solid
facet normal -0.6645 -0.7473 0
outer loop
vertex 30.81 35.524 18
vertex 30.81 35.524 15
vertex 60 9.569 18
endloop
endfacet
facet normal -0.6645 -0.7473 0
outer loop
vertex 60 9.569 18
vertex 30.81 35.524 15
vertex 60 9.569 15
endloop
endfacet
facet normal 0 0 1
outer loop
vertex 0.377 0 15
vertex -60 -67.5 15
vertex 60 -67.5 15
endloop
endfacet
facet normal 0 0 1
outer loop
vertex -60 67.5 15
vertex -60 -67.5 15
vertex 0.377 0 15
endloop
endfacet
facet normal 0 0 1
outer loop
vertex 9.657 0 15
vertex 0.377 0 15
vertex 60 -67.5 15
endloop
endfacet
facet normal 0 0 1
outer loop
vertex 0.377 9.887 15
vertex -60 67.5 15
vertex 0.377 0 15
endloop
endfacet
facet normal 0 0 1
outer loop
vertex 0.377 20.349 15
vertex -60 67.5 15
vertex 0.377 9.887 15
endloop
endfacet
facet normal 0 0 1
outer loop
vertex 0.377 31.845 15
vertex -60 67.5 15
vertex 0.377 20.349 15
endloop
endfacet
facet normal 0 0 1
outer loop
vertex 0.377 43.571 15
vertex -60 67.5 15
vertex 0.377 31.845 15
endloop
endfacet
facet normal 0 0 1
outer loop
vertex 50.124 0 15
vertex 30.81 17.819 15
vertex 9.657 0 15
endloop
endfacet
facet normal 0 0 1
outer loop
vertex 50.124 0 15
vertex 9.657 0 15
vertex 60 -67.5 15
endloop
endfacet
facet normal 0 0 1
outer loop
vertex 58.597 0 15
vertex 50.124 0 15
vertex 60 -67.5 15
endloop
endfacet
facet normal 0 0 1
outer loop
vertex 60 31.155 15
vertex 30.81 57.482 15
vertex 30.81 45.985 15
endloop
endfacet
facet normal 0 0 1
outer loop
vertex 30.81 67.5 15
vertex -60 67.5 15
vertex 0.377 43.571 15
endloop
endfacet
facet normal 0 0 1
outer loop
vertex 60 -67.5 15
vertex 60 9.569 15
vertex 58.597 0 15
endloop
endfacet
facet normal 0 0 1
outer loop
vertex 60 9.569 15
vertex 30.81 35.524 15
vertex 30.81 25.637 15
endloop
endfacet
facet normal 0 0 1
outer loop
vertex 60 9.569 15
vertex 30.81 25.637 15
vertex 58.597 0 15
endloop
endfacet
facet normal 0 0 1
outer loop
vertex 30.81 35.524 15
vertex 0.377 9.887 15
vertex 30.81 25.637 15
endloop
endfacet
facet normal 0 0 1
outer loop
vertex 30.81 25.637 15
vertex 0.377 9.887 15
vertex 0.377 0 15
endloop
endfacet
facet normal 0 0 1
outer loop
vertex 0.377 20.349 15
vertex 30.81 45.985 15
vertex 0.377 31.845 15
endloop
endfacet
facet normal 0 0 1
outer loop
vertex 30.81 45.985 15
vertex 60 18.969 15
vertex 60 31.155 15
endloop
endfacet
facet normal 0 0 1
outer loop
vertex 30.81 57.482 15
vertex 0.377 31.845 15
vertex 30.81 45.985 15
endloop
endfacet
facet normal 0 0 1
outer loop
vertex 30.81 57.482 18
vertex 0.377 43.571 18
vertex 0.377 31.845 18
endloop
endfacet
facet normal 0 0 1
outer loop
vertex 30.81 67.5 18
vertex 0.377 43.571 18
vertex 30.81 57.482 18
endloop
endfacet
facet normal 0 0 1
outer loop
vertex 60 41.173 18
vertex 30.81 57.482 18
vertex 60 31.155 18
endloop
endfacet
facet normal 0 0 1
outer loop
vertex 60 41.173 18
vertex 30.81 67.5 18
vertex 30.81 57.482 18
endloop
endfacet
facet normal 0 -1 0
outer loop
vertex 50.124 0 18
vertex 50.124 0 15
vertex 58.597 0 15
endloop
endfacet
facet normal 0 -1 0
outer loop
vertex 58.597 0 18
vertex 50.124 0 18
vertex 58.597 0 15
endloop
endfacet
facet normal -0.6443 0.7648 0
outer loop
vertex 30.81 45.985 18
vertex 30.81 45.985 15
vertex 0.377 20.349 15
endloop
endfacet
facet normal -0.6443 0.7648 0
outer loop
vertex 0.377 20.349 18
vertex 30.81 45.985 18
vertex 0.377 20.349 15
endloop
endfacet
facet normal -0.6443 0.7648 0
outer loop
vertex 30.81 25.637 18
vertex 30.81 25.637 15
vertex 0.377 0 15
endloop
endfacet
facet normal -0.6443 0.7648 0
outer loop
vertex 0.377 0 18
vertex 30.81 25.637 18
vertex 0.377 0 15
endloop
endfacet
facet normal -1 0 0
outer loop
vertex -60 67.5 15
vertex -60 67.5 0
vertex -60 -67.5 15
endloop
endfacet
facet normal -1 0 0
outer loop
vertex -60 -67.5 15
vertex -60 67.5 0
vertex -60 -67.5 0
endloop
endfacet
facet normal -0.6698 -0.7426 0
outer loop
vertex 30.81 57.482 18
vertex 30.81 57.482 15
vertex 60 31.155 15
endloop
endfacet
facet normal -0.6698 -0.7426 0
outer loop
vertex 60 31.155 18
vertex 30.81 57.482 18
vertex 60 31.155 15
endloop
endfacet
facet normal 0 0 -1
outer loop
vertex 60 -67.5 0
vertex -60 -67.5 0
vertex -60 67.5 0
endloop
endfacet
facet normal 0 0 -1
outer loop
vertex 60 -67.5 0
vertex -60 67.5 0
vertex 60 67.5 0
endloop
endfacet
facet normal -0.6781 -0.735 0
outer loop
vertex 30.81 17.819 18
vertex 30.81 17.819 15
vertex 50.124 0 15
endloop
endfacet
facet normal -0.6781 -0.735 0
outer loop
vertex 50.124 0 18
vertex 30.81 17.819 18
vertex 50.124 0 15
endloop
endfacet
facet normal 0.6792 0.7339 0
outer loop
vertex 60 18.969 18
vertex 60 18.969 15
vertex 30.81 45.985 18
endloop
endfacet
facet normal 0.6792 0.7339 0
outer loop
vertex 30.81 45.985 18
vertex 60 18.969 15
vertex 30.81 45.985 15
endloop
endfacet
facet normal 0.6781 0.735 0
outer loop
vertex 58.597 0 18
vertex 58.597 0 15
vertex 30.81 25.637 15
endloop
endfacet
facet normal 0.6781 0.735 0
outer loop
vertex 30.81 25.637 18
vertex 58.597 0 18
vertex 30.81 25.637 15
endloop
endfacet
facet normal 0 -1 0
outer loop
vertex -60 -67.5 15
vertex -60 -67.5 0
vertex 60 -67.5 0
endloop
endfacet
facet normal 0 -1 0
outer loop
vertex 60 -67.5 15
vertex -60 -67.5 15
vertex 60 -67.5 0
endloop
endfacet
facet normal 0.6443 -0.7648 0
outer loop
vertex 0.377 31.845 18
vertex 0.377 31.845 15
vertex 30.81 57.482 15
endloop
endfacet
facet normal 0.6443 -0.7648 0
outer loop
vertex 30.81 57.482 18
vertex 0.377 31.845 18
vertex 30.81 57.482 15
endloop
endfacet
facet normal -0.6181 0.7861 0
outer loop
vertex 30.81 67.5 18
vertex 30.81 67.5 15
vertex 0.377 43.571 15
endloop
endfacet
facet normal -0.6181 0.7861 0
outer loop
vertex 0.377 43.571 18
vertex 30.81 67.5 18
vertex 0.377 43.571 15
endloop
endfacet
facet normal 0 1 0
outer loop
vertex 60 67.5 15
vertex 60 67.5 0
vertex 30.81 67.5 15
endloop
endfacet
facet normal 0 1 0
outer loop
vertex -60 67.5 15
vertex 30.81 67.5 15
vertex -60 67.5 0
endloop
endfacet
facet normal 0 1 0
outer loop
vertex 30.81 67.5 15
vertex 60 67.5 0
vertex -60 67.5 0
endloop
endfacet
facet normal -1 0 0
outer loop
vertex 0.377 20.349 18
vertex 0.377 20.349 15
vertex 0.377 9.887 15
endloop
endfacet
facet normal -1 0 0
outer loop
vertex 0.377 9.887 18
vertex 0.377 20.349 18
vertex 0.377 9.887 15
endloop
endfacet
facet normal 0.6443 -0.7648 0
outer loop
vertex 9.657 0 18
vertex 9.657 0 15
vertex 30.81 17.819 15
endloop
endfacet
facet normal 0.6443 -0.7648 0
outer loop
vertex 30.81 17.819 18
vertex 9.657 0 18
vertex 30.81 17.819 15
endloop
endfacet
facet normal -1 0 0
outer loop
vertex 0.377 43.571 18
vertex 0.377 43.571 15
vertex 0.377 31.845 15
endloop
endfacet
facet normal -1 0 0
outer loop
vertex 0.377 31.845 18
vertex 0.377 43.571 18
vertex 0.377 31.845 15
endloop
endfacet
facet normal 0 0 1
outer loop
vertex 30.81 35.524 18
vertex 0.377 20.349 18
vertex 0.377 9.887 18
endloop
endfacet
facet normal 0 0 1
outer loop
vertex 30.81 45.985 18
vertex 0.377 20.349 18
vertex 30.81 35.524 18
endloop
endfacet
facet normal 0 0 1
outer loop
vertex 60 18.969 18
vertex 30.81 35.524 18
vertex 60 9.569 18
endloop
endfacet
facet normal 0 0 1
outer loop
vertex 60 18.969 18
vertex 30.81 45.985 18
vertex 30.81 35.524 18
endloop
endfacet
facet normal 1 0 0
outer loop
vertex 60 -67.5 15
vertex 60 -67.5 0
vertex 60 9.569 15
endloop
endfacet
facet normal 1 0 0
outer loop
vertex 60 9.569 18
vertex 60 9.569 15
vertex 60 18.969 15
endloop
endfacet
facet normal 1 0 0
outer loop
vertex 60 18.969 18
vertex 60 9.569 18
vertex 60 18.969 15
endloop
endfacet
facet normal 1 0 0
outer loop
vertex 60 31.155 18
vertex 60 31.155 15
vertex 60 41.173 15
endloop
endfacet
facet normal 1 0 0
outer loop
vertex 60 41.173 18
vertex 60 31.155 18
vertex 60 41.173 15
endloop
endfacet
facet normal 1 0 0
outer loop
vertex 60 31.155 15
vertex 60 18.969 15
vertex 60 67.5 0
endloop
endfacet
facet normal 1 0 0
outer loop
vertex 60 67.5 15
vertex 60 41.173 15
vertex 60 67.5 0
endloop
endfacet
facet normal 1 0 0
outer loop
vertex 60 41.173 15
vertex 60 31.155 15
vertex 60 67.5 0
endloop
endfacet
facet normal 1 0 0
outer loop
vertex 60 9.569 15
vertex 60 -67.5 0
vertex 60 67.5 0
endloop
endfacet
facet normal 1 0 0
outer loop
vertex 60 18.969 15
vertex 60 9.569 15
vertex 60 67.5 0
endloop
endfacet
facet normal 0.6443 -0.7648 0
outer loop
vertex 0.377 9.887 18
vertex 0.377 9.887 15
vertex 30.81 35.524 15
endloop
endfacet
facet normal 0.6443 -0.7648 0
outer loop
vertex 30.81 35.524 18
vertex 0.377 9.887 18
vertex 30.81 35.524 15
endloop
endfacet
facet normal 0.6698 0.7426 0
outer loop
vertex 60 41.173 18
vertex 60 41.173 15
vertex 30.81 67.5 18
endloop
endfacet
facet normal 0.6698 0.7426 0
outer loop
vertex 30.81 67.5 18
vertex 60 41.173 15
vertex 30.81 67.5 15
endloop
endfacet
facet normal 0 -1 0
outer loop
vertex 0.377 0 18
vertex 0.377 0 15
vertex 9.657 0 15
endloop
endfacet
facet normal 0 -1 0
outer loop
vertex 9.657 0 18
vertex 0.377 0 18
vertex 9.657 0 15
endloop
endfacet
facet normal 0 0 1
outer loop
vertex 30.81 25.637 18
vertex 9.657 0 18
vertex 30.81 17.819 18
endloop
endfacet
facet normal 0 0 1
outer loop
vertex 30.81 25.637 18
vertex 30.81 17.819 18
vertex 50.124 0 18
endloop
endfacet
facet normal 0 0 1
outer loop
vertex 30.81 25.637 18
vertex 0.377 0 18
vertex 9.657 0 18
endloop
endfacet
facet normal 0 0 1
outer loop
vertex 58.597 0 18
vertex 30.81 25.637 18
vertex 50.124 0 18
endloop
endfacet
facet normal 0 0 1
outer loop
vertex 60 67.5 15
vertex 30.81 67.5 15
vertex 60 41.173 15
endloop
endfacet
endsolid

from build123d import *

# Parameters (mm, degrees)
F0_W     = 60
F0_H     = 67.5
F1_DEPTH = 15
F3_DEPTH = 3


with BuildPart() as f1:
    # F0 (on Top) → F1 (new body)
    with BuildSketch(Plane.XY):
        with Locations((-30, 33.75)):
            Rectangle(F0_W, F0_H)
        Polygon((60, 67.5), (0, 67.5), (0, 0), (5.978101, 0), (60, 0), align=None)
        with Locations((-30, -33.75)):
            Rectangle(F0_W, F0_H)
        Polygon((5.978101, 0), (0, 0), (0, -67.5), (60, -67.5), (60, 0), align=None)
    extrude(amount=F1_DEPTH)

    # F2 (on face) → F3 (join)
    with BuildSketch(Plane.XY.offset(15)):
        Polygon((9.656936, 0), (30.810218, 17.819343), (50.12409, 0), (58.597274, 0), (30.810218, 25.636863), (0.376784, 0), align=None)
        Polygon((0.376784, 20.34854), (0.376784, 9.886861), (30.810218, 35.523724), (60, 9.569461), (60, 18.968979), (30.810218, 45.985403), align=None)
        Polygon((0.376784, 43.571167), (0.376784, 31.844892), (30.810218, 57.481755), (60, 31.155111), (60, 41.173357), (30.810218, 67.5), align=None)
    extrude(amount=F3_DEPTH)


solid = f1.part
